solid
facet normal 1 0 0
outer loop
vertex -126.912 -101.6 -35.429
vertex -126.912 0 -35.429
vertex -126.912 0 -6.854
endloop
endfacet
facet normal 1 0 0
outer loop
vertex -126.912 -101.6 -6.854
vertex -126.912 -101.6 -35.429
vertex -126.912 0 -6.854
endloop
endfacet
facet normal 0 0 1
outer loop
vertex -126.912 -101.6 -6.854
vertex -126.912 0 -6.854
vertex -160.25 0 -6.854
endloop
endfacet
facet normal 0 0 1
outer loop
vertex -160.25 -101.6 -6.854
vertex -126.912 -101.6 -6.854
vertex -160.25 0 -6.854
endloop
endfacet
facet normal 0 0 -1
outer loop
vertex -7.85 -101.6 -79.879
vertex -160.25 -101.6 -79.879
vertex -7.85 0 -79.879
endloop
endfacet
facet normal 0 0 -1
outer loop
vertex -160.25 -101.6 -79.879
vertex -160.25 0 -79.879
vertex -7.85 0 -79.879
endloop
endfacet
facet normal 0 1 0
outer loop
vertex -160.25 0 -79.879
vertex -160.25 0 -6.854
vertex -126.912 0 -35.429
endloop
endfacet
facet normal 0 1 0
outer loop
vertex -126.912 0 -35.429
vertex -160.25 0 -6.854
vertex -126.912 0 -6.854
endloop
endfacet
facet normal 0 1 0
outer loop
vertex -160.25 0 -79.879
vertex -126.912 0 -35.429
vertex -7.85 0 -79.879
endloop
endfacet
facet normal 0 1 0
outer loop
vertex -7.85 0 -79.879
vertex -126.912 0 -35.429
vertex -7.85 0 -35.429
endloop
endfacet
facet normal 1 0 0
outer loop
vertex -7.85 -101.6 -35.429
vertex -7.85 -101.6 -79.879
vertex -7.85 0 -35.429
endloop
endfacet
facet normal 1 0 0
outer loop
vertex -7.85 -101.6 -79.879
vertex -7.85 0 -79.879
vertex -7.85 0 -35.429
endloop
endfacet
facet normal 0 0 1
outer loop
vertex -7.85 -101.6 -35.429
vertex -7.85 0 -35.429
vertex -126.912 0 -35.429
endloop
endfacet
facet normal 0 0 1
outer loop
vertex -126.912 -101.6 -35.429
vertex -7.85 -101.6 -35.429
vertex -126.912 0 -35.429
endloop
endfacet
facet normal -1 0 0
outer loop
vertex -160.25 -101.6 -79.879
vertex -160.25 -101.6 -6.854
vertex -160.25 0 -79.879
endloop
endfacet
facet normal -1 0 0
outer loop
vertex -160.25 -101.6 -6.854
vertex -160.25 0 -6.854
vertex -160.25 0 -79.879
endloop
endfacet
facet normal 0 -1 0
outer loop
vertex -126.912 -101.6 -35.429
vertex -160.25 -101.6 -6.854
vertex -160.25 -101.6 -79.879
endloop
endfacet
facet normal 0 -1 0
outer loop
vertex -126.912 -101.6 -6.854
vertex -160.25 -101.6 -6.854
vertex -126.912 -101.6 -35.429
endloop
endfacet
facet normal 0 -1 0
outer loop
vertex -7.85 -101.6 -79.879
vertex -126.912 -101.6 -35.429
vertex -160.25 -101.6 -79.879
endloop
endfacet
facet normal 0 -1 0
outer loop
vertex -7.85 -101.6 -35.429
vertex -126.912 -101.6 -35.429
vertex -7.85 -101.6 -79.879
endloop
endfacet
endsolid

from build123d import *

# Parameters (mm, degrees)
F1_DEPTH = 25.4
F2_DEPTH = 25.4
F3_DEPTH = 50.8


with BuildPart() as f1:
    # F0 (on Front) → F1 (new body)
    with BuildSketch(Plane.XZ):
        Polygon((-126.9120896435, -6.8535663185), (-160.2495896435, -6.8535663185), (-160.2495896435, -79.8785663185), (-7.8495896435, -79.8785663185), (-7.8495896435, -35.4285663185), (-126.9120896435, -35.4285663185), align=None)
    extrude(amount=F1_DEPTH)

    # F2 (add): a face of the model
    f2_faces = [f1.faces().sort_by_distance(p)[0] for p in [
        (-91.3890588215, -25.4, -53.1520252226),
    ]]
    extrude(f2_faces, amount=F2_DEPTH)

    # F3 (add): a face of the model
    f3_faces = [f1.faces().sort_by_distance(p)[0] for p in [
        (-91.3890588215, -50.8, -53.1520252226),
    ]]
    extrude(f3_faces, amount=F3_DEPTH)


solid = f1.part
